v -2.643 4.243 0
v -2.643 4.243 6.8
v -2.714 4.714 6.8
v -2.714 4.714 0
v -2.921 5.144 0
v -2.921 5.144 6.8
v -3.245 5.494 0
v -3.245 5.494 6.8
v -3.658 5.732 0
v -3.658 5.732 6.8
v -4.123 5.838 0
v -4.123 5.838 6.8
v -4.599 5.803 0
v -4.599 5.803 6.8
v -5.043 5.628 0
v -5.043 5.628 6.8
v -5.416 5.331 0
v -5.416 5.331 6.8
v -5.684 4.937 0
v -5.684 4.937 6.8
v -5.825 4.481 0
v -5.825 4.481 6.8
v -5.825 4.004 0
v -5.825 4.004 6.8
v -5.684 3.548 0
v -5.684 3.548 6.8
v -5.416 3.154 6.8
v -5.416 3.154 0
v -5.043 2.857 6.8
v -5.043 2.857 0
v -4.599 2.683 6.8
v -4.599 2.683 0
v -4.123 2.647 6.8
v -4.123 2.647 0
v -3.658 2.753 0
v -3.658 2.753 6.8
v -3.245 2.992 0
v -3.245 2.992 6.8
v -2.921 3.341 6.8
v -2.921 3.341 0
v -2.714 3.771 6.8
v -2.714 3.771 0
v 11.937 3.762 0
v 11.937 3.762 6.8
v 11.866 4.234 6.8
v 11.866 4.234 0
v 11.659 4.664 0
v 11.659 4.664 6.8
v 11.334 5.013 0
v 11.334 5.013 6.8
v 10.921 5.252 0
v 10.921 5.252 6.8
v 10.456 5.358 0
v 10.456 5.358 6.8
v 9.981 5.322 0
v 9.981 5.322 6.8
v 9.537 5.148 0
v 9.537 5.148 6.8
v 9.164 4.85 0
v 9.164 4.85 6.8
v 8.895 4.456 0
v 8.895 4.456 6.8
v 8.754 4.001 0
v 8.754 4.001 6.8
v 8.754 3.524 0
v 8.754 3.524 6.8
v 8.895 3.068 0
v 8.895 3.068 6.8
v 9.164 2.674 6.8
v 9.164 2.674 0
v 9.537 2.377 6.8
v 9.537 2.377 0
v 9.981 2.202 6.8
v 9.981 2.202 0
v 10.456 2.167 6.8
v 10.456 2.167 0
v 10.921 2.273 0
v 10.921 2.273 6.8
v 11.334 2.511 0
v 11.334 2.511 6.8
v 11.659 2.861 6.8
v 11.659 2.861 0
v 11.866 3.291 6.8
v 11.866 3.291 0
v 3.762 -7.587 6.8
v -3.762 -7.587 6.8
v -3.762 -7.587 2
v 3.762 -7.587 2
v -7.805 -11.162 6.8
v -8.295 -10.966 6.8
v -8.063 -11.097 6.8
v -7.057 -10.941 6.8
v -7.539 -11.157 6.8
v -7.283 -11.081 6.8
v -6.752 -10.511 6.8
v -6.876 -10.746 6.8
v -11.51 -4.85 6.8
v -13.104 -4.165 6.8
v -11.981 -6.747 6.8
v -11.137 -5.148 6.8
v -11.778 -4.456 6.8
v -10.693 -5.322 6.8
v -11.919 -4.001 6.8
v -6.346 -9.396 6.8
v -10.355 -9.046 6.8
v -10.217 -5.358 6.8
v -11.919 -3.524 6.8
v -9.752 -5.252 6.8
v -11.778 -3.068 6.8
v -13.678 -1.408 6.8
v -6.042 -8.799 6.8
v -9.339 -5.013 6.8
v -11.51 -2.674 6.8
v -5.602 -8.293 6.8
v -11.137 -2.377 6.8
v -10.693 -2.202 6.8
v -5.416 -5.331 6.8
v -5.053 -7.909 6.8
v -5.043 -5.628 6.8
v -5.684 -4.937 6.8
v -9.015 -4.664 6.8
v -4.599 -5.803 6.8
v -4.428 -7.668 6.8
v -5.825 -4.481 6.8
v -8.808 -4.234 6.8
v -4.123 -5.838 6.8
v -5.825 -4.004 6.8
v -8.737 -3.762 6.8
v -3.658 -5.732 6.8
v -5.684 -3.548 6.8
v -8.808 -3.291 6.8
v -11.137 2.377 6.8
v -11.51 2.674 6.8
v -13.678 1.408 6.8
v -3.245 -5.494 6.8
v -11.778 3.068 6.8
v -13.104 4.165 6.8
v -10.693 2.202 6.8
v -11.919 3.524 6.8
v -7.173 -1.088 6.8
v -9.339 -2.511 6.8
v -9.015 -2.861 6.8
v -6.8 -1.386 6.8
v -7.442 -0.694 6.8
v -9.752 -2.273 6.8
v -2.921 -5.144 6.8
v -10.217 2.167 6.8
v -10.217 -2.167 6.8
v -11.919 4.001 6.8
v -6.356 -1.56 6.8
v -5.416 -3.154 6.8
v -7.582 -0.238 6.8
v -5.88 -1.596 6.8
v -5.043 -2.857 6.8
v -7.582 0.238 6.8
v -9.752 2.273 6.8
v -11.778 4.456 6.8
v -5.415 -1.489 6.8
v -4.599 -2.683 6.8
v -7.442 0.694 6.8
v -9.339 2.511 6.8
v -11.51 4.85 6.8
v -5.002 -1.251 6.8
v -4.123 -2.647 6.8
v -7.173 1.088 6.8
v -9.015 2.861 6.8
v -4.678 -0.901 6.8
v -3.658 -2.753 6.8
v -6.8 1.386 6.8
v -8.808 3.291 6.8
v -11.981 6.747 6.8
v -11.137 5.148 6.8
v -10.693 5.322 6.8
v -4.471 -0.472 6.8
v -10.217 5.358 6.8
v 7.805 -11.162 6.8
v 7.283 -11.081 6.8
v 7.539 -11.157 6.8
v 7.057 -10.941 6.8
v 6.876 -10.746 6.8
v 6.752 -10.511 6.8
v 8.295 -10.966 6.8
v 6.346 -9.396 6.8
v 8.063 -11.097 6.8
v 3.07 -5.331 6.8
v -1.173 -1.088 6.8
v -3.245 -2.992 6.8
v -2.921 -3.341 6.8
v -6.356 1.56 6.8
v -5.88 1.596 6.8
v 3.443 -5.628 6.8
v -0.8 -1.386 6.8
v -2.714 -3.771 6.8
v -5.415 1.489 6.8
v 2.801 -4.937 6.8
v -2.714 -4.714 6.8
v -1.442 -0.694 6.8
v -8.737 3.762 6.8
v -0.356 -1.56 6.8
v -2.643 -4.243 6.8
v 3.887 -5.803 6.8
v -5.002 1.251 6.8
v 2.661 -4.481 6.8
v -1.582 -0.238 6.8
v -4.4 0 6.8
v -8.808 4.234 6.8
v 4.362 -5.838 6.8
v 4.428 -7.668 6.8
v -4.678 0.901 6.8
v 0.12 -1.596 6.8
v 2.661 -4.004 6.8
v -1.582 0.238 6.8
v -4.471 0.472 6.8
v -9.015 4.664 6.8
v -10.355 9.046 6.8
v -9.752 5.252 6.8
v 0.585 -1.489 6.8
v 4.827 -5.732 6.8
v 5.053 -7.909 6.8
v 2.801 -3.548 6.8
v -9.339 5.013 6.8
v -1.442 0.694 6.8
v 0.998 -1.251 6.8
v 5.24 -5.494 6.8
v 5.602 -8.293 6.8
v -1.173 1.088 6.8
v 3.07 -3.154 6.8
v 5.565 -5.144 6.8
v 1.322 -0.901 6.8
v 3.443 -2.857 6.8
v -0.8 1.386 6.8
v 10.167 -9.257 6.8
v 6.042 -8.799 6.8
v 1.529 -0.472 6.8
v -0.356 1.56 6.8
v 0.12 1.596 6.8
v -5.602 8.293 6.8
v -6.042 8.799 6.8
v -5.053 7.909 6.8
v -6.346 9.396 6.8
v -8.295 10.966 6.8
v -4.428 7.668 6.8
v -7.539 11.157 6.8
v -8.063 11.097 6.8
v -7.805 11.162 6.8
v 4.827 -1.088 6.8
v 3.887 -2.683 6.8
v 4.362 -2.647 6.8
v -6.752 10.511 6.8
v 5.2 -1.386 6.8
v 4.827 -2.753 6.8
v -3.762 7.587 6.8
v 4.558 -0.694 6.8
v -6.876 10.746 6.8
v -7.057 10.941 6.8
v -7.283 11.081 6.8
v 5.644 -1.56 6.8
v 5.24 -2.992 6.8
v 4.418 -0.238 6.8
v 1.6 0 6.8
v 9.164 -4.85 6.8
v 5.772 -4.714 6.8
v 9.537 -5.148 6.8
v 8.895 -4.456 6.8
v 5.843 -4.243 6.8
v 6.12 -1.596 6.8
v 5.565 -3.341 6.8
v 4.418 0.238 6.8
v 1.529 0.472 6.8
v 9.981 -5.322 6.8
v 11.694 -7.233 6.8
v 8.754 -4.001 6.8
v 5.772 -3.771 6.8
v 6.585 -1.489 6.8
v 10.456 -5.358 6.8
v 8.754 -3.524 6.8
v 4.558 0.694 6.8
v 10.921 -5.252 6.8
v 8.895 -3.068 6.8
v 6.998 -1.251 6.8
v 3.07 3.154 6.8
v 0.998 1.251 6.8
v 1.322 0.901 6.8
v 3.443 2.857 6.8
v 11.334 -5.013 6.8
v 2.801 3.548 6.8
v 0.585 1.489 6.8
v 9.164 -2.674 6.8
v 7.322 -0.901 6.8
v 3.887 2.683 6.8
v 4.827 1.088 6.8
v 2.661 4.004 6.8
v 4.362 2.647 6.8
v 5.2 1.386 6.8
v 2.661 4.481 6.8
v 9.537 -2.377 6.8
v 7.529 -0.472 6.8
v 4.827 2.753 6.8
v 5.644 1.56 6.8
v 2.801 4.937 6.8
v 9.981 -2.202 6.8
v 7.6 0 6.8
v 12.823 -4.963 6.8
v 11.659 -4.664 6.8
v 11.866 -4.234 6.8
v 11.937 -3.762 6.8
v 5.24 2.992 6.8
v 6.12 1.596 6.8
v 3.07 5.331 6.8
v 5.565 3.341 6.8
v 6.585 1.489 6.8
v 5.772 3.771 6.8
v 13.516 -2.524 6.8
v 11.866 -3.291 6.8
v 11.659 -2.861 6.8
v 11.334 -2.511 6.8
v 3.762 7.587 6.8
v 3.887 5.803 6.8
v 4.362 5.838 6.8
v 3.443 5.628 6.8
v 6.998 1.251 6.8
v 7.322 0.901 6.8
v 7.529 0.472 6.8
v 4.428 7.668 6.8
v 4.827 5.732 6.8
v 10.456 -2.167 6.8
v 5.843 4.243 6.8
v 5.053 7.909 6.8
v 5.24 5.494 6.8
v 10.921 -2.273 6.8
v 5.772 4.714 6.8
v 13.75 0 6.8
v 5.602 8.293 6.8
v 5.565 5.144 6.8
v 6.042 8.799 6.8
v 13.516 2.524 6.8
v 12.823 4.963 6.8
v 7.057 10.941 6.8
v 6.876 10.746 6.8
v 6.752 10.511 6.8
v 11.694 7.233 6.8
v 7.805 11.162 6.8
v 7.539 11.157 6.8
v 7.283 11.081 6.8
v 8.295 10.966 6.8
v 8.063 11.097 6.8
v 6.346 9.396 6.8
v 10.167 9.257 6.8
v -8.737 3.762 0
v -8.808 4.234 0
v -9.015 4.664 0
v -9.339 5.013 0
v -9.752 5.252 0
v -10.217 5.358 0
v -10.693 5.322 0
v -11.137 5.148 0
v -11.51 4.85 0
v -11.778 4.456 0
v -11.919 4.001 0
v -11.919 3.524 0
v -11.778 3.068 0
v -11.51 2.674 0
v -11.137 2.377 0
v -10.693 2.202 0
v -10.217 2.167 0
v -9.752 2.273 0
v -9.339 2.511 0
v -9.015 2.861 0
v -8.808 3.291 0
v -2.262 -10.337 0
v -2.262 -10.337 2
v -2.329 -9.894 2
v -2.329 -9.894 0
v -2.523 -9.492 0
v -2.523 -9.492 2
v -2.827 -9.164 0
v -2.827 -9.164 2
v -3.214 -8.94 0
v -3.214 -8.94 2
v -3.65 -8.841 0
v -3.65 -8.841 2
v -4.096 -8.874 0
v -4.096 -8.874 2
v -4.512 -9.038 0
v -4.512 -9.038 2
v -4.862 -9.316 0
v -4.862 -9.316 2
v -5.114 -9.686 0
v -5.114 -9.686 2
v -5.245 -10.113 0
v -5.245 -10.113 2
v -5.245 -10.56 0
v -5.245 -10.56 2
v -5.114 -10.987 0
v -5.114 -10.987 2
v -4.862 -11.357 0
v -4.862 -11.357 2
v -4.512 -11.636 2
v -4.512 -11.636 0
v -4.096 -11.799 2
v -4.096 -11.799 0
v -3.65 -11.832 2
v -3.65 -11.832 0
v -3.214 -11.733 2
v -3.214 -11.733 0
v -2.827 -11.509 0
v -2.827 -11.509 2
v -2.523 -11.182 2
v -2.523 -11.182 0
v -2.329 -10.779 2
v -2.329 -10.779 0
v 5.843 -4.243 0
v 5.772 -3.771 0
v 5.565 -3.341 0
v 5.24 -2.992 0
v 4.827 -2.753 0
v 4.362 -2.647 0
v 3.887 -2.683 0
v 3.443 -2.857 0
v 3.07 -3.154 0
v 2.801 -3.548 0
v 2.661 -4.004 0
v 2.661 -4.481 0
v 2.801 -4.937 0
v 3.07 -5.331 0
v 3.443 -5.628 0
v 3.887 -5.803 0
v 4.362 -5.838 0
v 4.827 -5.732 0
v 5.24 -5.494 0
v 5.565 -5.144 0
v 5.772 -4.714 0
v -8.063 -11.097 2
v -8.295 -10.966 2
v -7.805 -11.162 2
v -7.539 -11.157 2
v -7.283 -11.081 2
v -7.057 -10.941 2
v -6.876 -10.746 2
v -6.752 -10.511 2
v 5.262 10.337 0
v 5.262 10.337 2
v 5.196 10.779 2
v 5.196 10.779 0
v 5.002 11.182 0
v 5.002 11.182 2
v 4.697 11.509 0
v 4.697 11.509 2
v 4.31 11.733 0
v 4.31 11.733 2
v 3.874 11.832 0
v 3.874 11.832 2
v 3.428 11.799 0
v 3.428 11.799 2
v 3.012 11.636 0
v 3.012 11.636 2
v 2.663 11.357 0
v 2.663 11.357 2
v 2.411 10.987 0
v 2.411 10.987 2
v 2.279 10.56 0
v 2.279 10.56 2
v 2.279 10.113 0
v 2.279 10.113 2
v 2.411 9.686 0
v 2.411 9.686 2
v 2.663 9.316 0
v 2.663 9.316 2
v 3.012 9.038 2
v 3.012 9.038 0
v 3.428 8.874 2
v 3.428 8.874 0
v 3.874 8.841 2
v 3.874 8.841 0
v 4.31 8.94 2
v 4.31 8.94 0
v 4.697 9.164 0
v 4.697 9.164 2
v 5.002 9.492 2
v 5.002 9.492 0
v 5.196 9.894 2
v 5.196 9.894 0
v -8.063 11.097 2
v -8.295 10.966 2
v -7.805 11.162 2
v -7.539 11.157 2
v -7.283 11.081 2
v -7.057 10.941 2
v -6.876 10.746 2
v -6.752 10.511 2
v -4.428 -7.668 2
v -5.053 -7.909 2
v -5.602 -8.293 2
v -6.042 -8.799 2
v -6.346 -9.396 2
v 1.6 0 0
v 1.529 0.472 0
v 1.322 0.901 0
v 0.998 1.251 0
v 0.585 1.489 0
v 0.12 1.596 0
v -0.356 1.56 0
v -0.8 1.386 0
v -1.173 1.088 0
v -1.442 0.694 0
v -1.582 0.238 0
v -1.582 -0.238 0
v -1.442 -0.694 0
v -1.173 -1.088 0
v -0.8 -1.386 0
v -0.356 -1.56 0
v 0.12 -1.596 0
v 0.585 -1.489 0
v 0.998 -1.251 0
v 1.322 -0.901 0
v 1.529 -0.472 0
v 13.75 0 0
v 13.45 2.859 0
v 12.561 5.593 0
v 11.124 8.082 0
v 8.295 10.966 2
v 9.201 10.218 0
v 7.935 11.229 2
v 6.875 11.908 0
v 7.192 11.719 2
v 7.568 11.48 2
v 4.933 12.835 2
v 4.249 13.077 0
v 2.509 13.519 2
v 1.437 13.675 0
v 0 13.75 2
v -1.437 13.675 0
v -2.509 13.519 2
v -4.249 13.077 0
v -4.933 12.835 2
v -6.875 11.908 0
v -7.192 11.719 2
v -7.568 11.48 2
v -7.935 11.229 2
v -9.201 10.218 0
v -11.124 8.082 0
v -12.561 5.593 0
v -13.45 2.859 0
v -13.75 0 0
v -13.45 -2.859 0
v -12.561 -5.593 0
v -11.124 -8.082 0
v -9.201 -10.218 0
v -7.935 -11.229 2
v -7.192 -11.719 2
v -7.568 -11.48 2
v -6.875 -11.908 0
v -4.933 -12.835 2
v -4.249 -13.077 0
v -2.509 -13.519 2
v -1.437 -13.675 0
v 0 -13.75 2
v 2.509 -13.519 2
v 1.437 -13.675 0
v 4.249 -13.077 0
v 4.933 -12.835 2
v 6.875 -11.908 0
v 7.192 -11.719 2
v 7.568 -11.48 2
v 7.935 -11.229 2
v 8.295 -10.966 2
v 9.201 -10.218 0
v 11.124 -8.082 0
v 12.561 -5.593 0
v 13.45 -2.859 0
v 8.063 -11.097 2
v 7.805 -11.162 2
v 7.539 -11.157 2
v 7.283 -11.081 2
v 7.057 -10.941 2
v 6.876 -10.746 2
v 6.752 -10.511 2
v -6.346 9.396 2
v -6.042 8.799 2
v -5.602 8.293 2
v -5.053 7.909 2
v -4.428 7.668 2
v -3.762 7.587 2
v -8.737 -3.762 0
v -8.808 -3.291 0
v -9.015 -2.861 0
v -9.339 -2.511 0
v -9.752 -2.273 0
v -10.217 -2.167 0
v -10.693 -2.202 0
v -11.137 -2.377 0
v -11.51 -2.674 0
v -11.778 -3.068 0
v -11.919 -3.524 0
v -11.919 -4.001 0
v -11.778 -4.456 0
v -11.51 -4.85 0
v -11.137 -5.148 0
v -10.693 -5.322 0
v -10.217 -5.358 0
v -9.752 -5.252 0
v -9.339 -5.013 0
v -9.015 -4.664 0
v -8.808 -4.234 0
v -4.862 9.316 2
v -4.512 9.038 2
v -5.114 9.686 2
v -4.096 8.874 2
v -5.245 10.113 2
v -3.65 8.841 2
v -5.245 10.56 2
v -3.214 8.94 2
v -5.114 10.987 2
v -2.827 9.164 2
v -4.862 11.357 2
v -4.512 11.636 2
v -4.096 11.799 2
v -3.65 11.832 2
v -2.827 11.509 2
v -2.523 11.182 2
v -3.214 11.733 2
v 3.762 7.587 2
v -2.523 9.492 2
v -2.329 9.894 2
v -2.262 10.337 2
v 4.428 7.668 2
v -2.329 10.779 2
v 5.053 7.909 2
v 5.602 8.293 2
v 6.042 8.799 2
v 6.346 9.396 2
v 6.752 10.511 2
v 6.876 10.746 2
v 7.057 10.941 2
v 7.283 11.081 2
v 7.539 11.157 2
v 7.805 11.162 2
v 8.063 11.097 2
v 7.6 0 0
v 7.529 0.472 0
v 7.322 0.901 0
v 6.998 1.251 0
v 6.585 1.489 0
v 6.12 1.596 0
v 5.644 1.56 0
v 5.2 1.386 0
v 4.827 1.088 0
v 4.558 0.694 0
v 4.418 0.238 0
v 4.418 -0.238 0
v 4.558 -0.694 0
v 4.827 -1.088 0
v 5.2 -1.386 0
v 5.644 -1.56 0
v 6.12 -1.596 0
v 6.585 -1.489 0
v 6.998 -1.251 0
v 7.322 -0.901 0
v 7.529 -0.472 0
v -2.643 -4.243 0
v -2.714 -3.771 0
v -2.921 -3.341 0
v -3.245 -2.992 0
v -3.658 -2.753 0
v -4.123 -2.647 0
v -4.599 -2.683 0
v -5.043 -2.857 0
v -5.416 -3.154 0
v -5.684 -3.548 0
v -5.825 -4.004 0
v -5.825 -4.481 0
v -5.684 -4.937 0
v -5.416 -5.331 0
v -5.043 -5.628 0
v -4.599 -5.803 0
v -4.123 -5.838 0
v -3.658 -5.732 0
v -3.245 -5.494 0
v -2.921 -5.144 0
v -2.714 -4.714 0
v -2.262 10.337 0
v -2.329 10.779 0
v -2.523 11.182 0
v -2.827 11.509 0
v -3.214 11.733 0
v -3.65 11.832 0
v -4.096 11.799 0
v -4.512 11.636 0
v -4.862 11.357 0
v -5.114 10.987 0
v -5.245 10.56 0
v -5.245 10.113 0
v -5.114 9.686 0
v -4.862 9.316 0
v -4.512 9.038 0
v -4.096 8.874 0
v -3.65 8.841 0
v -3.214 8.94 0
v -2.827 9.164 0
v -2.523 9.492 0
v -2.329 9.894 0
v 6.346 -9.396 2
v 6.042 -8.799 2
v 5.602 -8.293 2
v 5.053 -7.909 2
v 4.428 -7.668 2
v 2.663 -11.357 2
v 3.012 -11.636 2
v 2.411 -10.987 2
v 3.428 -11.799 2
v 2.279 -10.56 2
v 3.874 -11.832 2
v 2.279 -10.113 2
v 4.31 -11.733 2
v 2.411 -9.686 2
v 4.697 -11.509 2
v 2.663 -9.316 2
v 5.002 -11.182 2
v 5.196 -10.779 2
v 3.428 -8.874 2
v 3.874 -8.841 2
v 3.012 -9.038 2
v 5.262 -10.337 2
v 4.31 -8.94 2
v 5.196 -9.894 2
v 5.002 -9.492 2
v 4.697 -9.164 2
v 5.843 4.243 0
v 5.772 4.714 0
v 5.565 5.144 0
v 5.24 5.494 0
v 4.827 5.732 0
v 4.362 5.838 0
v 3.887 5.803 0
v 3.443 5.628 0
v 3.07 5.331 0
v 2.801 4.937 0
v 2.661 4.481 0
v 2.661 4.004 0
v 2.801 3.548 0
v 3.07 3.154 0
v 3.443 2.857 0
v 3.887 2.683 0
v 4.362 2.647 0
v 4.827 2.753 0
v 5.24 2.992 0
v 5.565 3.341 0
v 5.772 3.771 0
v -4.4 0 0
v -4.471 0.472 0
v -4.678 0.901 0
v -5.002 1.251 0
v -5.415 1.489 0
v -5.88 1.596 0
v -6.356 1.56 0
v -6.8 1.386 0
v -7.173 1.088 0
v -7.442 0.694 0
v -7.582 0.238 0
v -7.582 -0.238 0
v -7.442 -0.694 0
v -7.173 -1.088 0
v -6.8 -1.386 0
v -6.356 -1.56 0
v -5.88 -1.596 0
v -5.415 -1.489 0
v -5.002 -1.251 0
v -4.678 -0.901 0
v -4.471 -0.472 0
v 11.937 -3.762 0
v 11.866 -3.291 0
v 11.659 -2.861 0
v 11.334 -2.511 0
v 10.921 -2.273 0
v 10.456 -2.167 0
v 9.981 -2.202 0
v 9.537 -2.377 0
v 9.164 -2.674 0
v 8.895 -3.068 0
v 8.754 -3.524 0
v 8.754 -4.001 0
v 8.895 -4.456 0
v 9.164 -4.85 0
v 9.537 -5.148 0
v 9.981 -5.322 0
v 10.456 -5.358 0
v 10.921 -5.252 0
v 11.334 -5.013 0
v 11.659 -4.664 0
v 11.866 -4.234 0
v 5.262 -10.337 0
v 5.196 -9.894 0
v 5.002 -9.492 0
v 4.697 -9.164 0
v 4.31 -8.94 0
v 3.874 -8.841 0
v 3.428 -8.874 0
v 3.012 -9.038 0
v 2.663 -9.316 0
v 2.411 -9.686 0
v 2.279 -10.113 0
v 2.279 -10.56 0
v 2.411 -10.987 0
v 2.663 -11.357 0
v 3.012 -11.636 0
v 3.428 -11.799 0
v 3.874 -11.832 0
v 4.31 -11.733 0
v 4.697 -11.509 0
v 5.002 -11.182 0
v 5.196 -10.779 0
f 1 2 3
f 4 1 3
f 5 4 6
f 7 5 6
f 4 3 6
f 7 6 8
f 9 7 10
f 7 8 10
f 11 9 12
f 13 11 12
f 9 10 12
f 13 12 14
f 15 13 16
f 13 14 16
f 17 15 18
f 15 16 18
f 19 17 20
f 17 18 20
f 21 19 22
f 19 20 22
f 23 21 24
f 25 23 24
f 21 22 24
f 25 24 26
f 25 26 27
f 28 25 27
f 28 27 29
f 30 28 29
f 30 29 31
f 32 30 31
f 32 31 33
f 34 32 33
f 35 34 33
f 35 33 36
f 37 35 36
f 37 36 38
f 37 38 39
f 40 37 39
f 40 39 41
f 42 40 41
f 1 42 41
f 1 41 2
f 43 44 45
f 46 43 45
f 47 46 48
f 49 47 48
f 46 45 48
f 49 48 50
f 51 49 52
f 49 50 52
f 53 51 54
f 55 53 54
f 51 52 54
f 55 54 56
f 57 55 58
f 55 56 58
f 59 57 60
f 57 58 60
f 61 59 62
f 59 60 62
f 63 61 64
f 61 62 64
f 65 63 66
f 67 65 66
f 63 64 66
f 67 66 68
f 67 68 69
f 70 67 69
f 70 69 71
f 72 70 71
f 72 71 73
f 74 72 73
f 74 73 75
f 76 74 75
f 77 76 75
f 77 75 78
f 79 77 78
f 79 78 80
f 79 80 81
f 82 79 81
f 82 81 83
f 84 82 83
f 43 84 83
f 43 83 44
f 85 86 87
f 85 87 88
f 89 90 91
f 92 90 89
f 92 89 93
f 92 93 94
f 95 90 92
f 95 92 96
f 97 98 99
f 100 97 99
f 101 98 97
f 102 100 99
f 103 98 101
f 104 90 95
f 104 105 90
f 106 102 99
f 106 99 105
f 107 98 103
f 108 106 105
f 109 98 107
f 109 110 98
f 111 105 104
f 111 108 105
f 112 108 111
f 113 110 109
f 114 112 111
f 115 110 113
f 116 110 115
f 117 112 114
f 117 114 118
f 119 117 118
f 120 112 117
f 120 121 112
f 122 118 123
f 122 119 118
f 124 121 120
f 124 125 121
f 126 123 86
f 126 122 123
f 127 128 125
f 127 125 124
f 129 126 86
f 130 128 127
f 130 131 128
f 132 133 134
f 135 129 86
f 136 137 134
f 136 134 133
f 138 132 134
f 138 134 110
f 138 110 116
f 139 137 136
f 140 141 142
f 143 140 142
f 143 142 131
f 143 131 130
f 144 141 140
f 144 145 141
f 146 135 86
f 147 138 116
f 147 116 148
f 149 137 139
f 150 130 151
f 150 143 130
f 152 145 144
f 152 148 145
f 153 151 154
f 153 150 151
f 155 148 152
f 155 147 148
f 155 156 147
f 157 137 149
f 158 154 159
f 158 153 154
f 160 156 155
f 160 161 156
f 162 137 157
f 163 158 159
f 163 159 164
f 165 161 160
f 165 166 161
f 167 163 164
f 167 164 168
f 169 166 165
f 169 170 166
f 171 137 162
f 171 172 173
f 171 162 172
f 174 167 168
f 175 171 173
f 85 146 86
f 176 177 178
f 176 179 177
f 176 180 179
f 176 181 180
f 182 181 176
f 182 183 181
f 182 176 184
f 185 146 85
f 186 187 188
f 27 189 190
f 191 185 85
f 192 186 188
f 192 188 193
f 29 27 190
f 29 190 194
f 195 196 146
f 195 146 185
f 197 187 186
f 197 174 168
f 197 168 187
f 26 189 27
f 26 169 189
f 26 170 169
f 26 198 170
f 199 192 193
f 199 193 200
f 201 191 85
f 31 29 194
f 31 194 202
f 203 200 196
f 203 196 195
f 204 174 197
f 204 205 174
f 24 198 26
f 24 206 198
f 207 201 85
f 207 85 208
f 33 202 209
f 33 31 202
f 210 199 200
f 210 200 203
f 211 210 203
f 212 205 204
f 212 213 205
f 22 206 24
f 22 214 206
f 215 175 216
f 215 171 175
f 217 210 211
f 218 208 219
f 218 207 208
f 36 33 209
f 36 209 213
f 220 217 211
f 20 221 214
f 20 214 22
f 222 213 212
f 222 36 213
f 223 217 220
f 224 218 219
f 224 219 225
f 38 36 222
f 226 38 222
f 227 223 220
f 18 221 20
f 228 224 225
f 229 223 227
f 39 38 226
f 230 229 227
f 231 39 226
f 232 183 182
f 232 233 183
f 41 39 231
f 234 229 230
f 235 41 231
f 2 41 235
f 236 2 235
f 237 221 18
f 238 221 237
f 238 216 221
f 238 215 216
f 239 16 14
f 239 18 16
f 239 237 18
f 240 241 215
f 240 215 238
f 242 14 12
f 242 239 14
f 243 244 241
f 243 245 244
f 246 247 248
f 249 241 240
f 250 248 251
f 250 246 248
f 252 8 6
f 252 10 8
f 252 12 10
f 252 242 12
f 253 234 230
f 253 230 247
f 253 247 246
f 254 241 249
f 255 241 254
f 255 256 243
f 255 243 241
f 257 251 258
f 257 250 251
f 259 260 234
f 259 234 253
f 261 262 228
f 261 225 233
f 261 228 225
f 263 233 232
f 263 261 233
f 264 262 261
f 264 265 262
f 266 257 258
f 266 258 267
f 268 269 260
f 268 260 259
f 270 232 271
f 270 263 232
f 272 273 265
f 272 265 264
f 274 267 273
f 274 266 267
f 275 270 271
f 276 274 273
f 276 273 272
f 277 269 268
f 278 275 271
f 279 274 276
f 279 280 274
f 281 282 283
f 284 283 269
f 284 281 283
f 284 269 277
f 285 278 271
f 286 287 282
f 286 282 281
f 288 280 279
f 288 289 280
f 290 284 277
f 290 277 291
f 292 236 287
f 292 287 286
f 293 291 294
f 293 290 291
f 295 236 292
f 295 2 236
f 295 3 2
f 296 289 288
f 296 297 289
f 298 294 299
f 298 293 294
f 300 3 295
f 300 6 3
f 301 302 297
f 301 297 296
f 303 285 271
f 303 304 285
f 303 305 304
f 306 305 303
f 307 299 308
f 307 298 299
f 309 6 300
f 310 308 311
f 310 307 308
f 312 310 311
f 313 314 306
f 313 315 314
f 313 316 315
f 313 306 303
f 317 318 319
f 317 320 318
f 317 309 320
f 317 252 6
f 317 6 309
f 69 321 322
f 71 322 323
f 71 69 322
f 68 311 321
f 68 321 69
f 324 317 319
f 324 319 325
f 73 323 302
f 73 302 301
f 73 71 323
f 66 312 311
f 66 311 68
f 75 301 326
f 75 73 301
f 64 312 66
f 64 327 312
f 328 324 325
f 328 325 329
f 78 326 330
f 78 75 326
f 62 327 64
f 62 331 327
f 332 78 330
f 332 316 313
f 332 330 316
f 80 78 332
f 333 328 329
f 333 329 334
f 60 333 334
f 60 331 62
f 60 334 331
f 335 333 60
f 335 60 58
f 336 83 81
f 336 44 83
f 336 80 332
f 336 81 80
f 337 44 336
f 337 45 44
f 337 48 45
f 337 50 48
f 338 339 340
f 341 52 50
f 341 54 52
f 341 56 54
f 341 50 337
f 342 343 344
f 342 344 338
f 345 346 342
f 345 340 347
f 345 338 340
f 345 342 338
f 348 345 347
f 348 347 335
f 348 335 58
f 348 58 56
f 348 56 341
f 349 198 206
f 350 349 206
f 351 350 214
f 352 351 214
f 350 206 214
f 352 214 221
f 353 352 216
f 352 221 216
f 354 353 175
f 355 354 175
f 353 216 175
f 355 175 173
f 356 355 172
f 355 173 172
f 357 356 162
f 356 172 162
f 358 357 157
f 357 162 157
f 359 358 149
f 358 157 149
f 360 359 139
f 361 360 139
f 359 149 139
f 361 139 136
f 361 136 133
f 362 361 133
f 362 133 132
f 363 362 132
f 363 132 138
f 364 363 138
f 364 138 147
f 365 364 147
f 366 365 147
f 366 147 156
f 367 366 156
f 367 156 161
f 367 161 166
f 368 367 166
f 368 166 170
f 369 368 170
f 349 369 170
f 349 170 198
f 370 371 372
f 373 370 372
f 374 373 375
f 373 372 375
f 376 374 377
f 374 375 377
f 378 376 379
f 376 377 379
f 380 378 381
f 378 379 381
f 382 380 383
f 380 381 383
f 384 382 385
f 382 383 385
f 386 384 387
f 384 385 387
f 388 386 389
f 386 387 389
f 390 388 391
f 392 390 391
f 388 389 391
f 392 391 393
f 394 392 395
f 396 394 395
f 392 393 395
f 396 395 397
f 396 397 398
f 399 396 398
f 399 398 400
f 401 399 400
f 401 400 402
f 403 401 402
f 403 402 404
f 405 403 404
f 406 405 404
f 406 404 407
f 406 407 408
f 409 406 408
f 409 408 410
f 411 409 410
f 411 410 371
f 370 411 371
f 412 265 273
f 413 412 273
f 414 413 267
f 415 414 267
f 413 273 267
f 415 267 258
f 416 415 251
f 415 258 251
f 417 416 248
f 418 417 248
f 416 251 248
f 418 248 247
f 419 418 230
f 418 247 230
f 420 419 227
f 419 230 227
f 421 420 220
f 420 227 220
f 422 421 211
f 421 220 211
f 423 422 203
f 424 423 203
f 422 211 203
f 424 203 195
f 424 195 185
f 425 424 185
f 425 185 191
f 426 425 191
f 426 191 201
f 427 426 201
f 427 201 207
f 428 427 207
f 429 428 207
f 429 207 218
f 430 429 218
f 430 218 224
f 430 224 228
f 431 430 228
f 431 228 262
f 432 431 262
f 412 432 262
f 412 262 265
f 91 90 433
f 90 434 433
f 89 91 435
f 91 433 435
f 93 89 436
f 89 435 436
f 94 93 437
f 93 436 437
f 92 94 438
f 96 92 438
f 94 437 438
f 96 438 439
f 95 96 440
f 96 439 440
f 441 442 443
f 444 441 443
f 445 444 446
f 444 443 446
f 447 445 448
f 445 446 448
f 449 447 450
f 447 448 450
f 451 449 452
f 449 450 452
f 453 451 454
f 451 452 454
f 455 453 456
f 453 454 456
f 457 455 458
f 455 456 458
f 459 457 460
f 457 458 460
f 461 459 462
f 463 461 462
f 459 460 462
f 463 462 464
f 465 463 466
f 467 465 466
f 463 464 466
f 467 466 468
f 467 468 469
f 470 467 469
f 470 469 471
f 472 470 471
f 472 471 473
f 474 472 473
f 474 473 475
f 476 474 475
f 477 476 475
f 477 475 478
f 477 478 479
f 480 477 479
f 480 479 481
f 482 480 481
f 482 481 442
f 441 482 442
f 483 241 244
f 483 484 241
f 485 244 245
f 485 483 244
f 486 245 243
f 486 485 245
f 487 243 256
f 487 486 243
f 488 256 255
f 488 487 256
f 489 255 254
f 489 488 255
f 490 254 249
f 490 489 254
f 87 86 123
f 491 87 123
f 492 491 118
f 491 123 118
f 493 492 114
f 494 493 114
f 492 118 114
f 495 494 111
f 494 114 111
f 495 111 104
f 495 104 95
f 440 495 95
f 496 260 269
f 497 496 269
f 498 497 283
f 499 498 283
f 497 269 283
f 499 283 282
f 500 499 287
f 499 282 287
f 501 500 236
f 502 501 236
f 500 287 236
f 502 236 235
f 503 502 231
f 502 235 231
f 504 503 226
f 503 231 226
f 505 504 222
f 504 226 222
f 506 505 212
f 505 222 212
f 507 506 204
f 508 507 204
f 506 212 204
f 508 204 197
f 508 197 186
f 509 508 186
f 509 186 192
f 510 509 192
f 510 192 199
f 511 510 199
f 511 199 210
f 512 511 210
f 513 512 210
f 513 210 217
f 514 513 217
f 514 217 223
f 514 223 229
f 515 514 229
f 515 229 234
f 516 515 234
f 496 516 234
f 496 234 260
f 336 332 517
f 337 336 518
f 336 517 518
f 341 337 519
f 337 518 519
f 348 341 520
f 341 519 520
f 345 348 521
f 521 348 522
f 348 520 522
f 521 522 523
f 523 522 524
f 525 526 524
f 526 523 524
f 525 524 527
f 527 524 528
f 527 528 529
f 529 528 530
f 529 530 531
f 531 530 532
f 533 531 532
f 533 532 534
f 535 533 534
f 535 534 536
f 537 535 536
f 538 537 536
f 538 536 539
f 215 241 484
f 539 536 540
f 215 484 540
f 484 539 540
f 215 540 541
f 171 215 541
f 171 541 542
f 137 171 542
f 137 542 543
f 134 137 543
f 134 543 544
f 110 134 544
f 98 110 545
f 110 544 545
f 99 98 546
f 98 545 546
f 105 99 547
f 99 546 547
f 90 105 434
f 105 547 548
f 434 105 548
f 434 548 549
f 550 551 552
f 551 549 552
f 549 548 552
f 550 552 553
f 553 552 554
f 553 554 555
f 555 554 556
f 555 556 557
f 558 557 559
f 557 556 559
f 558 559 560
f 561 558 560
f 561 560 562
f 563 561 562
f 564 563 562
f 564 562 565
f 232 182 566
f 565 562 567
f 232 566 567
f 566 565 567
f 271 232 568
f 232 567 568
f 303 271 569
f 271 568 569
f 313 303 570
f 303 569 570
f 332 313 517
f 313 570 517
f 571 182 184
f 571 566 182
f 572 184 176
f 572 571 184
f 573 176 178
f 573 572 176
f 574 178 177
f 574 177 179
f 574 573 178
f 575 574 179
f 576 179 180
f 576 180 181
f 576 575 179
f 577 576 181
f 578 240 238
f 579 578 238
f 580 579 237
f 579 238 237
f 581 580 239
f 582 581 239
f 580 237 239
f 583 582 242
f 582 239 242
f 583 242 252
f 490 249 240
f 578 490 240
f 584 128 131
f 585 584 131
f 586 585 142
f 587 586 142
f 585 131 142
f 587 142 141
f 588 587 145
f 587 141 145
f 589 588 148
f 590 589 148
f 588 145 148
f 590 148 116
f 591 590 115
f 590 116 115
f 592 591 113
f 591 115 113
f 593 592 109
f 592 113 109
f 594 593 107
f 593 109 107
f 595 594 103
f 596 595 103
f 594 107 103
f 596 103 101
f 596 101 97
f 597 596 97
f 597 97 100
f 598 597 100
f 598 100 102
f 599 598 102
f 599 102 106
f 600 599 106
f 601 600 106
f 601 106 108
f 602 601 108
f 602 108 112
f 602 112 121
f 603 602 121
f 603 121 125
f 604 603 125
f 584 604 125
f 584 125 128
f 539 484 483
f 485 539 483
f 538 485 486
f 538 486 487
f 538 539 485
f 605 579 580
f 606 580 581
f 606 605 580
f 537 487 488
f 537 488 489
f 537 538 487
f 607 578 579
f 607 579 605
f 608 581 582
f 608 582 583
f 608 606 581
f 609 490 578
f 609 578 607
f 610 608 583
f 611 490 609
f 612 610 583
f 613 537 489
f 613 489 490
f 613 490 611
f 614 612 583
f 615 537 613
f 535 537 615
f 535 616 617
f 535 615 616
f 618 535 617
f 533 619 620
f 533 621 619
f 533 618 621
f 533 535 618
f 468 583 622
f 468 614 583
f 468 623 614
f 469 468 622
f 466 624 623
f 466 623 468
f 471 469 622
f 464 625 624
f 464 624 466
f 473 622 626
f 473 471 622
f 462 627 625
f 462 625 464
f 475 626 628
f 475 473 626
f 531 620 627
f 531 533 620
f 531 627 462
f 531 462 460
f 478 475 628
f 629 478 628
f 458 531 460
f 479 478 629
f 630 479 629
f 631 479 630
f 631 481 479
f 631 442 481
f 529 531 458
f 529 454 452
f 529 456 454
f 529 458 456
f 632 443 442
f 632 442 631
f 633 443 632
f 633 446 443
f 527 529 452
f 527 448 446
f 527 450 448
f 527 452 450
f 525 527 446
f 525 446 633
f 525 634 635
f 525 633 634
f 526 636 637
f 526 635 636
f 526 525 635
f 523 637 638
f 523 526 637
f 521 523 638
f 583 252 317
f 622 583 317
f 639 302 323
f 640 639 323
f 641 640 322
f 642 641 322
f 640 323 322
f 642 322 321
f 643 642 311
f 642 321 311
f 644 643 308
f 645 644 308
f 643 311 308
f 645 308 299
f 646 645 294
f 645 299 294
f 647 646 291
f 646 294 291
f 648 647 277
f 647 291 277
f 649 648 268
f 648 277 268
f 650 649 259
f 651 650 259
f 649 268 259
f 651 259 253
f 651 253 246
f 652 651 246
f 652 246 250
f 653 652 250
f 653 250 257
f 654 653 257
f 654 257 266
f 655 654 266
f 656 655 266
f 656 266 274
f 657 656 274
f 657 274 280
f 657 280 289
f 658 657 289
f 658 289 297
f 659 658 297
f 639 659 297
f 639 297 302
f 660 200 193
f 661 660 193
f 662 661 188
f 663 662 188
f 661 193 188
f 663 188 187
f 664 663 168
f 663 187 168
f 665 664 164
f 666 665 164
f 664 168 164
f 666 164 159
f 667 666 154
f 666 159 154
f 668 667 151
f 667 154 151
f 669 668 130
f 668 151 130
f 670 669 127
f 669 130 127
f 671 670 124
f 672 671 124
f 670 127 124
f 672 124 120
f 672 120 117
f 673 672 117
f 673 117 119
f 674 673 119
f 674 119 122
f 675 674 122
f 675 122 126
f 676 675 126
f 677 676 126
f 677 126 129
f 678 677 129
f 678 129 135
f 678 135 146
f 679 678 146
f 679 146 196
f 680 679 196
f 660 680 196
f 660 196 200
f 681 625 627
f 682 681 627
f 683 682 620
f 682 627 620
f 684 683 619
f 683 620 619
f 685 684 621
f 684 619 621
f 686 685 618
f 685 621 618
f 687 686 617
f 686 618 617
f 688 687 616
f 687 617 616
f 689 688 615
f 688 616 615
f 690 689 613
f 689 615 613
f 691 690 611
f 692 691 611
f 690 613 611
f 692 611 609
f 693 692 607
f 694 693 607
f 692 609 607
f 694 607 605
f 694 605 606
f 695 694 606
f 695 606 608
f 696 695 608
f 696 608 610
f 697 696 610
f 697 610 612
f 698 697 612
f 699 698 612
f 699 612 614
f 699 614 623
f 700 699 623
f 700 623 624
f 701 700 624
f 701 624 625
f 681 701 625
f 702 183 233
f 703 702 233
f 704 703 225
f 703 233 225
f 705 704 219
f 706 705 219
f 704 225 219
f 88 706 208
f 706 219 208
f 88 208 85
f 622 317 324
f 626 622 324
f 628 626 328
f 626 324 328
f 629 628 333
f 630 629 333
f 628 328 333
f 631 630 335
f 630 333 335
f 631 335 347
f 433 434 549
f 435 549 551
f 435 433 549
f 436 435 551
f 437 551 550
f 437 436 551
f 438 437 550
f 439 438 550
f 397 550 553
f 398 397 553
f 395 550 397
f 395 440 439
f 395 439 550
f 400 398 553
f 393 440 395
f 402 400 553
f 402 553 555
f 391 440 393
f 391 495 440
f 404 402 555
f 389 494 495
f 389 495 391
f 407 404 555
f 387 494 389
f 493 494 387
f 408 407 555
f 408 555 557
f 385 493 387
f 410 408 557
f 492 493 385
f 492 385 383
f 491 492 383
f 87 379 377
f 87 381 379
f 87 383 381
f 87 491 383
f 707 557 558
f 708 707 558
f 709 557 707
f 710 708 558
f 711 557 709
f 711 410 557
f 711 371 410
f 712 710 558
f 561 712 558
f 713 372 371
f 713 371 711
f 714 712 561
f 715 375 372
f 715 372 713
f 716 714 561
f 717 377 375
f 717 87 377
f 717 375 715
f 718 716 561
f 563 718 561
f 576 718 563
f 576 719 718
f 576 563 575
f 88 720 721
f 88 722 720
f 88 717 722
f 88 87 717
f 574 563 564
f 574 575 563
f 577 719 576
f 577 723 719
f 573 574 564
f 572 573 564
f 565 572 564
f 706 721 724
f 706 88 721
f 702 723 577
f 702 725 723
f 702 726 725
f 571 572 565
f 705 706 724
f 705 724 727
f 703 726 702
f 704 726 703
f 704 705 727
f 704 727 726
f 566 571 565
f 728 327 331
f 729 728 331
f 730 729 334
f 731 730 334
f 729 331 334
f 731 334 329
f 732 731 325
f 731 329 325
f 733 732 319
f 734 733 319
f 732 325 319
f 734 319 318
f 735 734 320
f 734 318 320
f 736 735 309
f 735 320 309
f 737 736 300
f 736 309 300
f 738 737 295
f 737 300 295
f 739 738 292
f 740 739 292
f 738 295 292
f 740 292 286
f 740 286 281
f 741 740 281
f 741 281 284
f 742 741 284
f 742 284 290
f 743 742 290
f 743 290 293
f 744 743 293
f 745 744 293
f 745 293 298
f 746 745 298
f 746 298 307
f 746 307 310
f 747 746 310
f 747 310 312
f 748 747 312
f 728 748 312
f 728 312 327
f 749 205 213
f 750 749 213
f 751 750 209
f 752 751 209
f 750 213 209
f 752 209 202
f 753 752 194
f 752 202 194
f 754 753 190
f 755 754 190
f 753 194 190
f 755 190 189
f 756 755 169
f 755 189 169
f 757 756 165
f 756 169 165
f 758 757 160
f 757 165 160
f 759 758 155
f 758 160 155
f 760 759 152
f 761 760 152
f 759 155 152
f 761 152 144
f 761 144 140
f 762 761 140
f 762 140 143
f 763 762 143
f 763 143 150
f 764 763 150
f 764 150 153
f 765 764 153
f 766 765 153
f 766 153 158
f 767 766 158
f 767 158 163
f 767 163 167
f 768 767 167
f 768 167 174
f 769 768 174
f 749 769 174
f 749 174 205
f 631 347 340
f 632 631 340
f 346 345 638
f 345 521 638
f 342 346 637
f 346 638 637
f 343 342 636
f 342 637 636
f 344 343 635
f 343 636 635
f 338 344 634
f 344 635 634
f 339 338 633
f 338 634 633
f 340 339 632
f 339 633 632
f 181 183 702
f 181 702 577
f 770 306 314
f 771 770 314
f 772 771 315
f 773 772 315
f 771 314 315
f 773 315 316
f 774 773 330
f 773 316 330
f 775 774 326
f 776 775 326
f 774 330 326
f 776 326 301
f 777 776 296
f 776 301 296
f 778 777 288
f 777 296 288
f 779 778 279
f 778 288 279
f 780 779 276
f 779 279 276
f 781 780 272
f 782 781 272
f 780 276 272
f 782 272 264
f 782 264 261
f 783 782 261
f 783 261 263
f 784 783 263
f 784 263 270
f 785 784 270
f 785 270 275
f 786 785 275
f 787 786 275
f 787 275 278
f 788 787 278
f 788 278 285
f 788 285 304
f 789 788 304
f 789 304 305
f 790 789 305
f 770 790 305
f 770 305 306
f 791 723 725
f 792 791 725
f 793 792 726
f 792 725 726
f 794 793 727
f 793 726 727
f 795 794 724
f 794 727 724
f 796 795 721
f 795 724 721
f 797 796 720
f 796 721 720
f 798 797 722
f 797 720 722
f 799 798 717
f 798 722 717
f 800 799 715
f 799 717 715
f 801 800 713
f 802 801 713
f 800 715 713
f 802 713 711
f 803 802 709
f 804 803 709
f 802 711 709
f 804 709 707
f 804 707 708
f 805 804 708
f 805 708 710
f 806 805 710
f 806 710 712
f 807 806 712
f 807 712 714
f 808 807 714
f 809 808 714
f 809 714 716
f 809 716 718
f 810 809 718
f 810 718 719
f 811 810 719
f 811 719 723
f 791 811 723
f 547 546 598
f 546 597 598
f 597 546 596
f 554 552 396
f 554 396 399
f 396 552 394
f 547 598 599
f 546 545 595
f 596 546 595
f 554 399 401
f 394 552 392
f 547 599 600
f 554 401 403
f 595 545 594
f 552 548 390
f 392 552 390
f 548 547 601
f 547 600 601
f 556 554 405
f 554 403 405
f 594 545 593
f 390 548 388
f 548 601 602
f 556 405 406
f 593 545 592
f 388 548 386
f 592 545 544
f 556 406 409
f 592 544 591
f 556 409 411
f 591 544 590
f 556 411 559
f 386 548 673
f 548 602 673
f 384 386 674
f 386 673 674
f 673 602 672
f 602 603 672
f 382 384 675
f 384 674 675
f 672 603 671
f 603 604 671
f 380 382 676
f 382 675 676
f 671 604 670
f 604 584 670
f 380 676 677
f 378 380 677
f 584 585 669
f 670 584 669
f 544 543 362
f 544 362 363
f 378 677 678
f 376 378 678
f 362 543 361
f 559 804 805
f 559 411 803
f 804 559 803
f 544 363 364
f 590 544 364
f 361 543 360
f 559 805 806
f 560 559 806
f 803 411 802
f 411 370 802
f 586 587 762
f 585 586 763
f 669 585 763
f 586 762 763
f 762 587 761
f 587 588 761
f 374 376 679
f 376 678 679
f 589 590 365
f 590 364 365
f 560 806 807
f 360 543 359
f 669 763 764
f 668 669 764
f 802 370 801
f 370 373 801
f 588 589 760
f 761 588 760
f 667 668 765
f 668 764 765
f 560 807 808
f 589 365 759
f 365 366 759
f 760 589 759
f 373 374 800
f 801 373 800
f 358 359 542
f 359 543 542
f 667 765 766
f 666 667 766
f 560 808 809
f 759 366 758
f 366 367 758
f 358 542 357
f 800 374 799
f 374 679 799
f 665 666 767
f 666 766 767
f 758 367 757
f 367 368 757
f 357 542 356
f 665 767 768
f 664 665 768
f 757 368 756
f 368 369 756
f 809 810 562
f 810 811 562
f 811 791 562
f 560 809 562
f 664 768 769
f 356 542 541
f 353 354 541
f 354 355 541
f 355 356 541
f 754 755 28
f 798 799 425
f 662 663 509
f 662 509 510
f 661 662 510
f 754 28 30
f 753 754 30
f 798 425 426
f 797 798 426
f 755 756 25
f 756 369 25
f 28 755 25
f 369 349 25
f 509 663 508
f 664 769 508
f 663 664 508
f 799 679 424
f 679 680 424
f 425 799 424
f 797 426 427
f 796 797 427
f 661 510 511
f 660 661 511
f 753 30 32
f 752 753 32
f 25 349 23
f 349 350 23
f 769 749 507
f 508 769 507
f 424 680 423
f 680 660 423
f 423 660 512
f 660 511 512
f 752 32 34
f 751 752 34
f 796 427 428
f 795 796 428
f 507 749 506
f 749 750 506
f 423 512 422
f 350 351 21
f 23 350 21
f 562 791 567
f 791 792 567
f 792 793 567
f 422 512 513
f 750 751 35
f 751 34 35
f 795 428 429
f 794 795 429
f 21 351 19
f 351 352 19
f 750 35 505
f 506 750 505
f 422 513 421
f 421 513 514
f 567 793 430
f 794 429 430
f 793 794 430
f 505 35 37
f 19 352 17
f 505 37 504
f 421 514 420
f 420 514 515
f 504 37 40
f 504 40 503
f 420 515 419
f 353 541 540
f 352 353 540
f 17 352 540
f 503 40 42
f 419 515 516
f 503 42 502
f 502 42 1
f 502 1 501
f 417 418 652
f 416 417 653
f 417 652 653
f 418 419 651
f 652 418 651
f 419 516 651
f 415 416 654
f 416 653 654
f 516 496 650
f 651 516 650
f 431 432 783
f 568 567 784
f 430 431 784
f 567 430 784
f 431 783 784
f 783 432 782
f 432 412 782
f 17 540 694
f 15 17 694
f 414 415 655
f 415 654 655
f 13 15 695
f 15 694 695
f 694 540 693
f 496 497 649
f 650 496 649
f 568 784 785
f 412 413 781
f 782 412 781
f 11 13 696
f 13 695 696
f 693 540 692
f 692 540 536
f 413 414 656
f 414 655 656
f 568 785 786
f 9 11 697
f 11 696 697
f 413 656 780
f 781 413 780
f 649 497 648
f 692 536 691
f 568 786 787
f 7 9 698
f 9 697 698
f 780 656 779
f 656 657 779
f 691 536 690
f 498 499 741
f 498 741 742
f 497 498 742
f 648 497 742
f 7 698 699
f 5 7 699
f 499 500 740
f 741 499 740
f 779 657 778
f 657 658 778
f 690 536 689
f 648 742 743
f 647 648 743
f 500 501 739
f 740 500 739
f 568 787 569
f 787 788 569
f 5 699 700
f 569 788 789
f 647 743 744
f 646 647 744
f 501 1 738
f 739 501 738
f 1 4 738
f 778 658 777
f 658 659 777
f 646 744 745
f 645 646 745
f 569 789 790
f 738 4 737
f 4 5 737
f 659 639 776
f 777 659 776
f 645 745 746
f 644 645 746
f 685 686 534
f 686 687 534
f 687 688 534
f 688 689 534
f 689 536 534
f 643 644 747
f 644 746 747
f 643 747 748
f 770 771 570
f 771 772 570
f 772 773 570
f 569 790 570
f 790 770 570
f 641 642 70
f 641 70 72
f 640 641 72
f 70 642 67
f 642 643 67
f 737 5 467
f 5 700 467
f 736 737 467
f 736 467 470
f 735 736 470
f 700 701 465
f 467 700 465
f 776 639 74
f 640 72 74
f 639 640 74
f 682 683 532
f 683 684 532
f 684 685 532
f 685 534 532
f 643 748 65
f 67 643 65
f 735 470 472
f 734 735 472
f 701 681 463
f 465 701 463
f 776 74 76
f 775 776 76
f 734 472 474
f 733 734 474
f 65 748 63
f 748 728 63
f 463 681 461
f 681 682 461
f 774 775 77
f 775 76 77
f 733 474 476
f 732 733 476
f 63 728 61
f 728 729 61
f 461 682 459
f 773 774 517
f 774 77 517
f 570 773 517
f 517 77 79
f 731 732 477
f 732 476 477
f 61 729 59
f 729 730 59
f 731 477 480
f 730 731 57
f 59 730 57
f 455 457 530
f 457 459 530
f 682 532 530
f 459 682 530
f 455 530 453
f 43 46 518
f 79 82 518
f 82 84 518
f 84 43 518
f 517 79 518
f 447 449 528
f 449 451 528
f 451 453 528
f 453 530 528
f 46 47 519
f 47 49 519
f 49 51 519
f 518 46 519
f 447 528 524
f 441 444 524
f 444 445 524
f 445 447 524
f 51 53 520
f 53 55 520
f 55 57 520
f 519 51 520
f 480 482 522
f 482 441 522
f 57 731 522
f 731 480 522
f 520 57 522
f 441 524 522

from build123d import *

# Parameters (mm, degrees)
SKETCH_R        = 13.75
PAD_DEPTH       = 6.8
POCKET_DEPTH    = 4.8
SKETCH002_R     = 1.6
SKETCH002_R_2   = 1.5
POCKET001_DEPTH = 6.801
FILLET_R        = 1


with BuildPart() as part:
    # Sketch → Pad (new body)
    with BuildSketch(Plane.XY):
        Circle(SKETCH_R)
    extrude(amount=PAD_DEPTH)

    # Sketch001 (on Face3 of Pad) → Pocket (cut)
    with BuildSketch(Plane.XY.offset(6.8)):
        with BuildLine():
            ThreePointArc((-6.346376, 9.396063), (-5.339557, 8.083951), (-3.762222, 7.586619))
            Line((-3.762222, 7.586619), (3.762222, 7.586619))
            ThreePointArc((3.762222, 7.586619), (5.339557, 8.083951), (6.346376, 9.396063))
            Line((6.346376, 9.396063), (7.191916, 11.719166))
            ThreePointArc((7.191916, 11.719166), (0, 13.75), (-7.191916, 11.719166))
            Line((-7.191916, 11.719166), (-6.346376, 9.396063))
        make_face()
        with BuildLine():
            Line((-6.346376, -9.396063), (-7.191916, -11.719166))
            ThreePointArc((-7.191916, -11.719166), (0, -13.75), (7.191916, -11.719166))
            Line((6.346376, -9.396063), (7.191916, -11.719166))
            ThreePointArc((6.346376, -9.396063), (5.339557, -8.083951), (3.762222, -7.586619))
            Line((-3.762222, -7.586619), (3.762222, -7.586619))
            ThreePointArc((-3.762222, -7.586619), (-5.339557, -8.083951), (-6.346376, -9.396063))
        make_face()
    extrude(amount=-POCKET_DEPTH, mode=Mode.SUBTRACT)

    # Sketch002 (on Face3 of Pocket) → Pocket001 (cut, through all)
    with BuildSketch(Plane.XY.offset(6.8)):
        with Locations((-10.336619, 3.762222)):
            Circle(SKETCH002_R)
        with Locations((10.336619, 3.762222)):
            Circle(SKETCH002_R)
        with Locations((10.336619, -3.762222)):
            Circle(SKETCH002_R)
        with Locations((-10.336619, -3.762222)):
            Circle(SKETCH002_R)
        with Locations((3.762222, 10.336619)):
            Circle(SKETCH002_R_2)
        with Locations((-3.762222, 10.336619)):
            Circle(SKETCH002_R_2)
        with Locations((-3.762222, -10.336619)):
            Circle(SKETCH002_R_2)
        with Locations((3.762222, -10.336619)):
            Circle(SKETCH002_R_2)
        Circle(SKETCH002_R)
        with Locations((-4.242641, 4.242641)):
            Circle(SKETCH002_R)
        with Locations((4.242641, 4.242641)):
            Circle(SKETCH002_R)
        with Locations((4.242641, -4.242641)):
            Circle(SKETCH002_R)
        with Locations((-4.242641, -4.242641)):
            Circle(SKETCH002_R)
        with Locations((-6, 0)):
            Circle(SKETCH002_R)
        with Locations((6, 0)):
            Circle(SKETCH002_R)
    extrude(amount=-POCKET001_DEPTH, mode=Mode.SUBTRACT)

    # Fillet
    fillet_edges = [part.edges().sort_by_distance(p)[0] for p in [
        (-7.191916, -11.719166, 4.4),
        (7.191916, -11.719166, 4.4),
        (7.191916, 11.719166, 4.4),
        (-7.191916, 11.719166, 4.4),
    ]]
    fillet(fillet_edges, radius=FILLET_R)


solid = part.part
